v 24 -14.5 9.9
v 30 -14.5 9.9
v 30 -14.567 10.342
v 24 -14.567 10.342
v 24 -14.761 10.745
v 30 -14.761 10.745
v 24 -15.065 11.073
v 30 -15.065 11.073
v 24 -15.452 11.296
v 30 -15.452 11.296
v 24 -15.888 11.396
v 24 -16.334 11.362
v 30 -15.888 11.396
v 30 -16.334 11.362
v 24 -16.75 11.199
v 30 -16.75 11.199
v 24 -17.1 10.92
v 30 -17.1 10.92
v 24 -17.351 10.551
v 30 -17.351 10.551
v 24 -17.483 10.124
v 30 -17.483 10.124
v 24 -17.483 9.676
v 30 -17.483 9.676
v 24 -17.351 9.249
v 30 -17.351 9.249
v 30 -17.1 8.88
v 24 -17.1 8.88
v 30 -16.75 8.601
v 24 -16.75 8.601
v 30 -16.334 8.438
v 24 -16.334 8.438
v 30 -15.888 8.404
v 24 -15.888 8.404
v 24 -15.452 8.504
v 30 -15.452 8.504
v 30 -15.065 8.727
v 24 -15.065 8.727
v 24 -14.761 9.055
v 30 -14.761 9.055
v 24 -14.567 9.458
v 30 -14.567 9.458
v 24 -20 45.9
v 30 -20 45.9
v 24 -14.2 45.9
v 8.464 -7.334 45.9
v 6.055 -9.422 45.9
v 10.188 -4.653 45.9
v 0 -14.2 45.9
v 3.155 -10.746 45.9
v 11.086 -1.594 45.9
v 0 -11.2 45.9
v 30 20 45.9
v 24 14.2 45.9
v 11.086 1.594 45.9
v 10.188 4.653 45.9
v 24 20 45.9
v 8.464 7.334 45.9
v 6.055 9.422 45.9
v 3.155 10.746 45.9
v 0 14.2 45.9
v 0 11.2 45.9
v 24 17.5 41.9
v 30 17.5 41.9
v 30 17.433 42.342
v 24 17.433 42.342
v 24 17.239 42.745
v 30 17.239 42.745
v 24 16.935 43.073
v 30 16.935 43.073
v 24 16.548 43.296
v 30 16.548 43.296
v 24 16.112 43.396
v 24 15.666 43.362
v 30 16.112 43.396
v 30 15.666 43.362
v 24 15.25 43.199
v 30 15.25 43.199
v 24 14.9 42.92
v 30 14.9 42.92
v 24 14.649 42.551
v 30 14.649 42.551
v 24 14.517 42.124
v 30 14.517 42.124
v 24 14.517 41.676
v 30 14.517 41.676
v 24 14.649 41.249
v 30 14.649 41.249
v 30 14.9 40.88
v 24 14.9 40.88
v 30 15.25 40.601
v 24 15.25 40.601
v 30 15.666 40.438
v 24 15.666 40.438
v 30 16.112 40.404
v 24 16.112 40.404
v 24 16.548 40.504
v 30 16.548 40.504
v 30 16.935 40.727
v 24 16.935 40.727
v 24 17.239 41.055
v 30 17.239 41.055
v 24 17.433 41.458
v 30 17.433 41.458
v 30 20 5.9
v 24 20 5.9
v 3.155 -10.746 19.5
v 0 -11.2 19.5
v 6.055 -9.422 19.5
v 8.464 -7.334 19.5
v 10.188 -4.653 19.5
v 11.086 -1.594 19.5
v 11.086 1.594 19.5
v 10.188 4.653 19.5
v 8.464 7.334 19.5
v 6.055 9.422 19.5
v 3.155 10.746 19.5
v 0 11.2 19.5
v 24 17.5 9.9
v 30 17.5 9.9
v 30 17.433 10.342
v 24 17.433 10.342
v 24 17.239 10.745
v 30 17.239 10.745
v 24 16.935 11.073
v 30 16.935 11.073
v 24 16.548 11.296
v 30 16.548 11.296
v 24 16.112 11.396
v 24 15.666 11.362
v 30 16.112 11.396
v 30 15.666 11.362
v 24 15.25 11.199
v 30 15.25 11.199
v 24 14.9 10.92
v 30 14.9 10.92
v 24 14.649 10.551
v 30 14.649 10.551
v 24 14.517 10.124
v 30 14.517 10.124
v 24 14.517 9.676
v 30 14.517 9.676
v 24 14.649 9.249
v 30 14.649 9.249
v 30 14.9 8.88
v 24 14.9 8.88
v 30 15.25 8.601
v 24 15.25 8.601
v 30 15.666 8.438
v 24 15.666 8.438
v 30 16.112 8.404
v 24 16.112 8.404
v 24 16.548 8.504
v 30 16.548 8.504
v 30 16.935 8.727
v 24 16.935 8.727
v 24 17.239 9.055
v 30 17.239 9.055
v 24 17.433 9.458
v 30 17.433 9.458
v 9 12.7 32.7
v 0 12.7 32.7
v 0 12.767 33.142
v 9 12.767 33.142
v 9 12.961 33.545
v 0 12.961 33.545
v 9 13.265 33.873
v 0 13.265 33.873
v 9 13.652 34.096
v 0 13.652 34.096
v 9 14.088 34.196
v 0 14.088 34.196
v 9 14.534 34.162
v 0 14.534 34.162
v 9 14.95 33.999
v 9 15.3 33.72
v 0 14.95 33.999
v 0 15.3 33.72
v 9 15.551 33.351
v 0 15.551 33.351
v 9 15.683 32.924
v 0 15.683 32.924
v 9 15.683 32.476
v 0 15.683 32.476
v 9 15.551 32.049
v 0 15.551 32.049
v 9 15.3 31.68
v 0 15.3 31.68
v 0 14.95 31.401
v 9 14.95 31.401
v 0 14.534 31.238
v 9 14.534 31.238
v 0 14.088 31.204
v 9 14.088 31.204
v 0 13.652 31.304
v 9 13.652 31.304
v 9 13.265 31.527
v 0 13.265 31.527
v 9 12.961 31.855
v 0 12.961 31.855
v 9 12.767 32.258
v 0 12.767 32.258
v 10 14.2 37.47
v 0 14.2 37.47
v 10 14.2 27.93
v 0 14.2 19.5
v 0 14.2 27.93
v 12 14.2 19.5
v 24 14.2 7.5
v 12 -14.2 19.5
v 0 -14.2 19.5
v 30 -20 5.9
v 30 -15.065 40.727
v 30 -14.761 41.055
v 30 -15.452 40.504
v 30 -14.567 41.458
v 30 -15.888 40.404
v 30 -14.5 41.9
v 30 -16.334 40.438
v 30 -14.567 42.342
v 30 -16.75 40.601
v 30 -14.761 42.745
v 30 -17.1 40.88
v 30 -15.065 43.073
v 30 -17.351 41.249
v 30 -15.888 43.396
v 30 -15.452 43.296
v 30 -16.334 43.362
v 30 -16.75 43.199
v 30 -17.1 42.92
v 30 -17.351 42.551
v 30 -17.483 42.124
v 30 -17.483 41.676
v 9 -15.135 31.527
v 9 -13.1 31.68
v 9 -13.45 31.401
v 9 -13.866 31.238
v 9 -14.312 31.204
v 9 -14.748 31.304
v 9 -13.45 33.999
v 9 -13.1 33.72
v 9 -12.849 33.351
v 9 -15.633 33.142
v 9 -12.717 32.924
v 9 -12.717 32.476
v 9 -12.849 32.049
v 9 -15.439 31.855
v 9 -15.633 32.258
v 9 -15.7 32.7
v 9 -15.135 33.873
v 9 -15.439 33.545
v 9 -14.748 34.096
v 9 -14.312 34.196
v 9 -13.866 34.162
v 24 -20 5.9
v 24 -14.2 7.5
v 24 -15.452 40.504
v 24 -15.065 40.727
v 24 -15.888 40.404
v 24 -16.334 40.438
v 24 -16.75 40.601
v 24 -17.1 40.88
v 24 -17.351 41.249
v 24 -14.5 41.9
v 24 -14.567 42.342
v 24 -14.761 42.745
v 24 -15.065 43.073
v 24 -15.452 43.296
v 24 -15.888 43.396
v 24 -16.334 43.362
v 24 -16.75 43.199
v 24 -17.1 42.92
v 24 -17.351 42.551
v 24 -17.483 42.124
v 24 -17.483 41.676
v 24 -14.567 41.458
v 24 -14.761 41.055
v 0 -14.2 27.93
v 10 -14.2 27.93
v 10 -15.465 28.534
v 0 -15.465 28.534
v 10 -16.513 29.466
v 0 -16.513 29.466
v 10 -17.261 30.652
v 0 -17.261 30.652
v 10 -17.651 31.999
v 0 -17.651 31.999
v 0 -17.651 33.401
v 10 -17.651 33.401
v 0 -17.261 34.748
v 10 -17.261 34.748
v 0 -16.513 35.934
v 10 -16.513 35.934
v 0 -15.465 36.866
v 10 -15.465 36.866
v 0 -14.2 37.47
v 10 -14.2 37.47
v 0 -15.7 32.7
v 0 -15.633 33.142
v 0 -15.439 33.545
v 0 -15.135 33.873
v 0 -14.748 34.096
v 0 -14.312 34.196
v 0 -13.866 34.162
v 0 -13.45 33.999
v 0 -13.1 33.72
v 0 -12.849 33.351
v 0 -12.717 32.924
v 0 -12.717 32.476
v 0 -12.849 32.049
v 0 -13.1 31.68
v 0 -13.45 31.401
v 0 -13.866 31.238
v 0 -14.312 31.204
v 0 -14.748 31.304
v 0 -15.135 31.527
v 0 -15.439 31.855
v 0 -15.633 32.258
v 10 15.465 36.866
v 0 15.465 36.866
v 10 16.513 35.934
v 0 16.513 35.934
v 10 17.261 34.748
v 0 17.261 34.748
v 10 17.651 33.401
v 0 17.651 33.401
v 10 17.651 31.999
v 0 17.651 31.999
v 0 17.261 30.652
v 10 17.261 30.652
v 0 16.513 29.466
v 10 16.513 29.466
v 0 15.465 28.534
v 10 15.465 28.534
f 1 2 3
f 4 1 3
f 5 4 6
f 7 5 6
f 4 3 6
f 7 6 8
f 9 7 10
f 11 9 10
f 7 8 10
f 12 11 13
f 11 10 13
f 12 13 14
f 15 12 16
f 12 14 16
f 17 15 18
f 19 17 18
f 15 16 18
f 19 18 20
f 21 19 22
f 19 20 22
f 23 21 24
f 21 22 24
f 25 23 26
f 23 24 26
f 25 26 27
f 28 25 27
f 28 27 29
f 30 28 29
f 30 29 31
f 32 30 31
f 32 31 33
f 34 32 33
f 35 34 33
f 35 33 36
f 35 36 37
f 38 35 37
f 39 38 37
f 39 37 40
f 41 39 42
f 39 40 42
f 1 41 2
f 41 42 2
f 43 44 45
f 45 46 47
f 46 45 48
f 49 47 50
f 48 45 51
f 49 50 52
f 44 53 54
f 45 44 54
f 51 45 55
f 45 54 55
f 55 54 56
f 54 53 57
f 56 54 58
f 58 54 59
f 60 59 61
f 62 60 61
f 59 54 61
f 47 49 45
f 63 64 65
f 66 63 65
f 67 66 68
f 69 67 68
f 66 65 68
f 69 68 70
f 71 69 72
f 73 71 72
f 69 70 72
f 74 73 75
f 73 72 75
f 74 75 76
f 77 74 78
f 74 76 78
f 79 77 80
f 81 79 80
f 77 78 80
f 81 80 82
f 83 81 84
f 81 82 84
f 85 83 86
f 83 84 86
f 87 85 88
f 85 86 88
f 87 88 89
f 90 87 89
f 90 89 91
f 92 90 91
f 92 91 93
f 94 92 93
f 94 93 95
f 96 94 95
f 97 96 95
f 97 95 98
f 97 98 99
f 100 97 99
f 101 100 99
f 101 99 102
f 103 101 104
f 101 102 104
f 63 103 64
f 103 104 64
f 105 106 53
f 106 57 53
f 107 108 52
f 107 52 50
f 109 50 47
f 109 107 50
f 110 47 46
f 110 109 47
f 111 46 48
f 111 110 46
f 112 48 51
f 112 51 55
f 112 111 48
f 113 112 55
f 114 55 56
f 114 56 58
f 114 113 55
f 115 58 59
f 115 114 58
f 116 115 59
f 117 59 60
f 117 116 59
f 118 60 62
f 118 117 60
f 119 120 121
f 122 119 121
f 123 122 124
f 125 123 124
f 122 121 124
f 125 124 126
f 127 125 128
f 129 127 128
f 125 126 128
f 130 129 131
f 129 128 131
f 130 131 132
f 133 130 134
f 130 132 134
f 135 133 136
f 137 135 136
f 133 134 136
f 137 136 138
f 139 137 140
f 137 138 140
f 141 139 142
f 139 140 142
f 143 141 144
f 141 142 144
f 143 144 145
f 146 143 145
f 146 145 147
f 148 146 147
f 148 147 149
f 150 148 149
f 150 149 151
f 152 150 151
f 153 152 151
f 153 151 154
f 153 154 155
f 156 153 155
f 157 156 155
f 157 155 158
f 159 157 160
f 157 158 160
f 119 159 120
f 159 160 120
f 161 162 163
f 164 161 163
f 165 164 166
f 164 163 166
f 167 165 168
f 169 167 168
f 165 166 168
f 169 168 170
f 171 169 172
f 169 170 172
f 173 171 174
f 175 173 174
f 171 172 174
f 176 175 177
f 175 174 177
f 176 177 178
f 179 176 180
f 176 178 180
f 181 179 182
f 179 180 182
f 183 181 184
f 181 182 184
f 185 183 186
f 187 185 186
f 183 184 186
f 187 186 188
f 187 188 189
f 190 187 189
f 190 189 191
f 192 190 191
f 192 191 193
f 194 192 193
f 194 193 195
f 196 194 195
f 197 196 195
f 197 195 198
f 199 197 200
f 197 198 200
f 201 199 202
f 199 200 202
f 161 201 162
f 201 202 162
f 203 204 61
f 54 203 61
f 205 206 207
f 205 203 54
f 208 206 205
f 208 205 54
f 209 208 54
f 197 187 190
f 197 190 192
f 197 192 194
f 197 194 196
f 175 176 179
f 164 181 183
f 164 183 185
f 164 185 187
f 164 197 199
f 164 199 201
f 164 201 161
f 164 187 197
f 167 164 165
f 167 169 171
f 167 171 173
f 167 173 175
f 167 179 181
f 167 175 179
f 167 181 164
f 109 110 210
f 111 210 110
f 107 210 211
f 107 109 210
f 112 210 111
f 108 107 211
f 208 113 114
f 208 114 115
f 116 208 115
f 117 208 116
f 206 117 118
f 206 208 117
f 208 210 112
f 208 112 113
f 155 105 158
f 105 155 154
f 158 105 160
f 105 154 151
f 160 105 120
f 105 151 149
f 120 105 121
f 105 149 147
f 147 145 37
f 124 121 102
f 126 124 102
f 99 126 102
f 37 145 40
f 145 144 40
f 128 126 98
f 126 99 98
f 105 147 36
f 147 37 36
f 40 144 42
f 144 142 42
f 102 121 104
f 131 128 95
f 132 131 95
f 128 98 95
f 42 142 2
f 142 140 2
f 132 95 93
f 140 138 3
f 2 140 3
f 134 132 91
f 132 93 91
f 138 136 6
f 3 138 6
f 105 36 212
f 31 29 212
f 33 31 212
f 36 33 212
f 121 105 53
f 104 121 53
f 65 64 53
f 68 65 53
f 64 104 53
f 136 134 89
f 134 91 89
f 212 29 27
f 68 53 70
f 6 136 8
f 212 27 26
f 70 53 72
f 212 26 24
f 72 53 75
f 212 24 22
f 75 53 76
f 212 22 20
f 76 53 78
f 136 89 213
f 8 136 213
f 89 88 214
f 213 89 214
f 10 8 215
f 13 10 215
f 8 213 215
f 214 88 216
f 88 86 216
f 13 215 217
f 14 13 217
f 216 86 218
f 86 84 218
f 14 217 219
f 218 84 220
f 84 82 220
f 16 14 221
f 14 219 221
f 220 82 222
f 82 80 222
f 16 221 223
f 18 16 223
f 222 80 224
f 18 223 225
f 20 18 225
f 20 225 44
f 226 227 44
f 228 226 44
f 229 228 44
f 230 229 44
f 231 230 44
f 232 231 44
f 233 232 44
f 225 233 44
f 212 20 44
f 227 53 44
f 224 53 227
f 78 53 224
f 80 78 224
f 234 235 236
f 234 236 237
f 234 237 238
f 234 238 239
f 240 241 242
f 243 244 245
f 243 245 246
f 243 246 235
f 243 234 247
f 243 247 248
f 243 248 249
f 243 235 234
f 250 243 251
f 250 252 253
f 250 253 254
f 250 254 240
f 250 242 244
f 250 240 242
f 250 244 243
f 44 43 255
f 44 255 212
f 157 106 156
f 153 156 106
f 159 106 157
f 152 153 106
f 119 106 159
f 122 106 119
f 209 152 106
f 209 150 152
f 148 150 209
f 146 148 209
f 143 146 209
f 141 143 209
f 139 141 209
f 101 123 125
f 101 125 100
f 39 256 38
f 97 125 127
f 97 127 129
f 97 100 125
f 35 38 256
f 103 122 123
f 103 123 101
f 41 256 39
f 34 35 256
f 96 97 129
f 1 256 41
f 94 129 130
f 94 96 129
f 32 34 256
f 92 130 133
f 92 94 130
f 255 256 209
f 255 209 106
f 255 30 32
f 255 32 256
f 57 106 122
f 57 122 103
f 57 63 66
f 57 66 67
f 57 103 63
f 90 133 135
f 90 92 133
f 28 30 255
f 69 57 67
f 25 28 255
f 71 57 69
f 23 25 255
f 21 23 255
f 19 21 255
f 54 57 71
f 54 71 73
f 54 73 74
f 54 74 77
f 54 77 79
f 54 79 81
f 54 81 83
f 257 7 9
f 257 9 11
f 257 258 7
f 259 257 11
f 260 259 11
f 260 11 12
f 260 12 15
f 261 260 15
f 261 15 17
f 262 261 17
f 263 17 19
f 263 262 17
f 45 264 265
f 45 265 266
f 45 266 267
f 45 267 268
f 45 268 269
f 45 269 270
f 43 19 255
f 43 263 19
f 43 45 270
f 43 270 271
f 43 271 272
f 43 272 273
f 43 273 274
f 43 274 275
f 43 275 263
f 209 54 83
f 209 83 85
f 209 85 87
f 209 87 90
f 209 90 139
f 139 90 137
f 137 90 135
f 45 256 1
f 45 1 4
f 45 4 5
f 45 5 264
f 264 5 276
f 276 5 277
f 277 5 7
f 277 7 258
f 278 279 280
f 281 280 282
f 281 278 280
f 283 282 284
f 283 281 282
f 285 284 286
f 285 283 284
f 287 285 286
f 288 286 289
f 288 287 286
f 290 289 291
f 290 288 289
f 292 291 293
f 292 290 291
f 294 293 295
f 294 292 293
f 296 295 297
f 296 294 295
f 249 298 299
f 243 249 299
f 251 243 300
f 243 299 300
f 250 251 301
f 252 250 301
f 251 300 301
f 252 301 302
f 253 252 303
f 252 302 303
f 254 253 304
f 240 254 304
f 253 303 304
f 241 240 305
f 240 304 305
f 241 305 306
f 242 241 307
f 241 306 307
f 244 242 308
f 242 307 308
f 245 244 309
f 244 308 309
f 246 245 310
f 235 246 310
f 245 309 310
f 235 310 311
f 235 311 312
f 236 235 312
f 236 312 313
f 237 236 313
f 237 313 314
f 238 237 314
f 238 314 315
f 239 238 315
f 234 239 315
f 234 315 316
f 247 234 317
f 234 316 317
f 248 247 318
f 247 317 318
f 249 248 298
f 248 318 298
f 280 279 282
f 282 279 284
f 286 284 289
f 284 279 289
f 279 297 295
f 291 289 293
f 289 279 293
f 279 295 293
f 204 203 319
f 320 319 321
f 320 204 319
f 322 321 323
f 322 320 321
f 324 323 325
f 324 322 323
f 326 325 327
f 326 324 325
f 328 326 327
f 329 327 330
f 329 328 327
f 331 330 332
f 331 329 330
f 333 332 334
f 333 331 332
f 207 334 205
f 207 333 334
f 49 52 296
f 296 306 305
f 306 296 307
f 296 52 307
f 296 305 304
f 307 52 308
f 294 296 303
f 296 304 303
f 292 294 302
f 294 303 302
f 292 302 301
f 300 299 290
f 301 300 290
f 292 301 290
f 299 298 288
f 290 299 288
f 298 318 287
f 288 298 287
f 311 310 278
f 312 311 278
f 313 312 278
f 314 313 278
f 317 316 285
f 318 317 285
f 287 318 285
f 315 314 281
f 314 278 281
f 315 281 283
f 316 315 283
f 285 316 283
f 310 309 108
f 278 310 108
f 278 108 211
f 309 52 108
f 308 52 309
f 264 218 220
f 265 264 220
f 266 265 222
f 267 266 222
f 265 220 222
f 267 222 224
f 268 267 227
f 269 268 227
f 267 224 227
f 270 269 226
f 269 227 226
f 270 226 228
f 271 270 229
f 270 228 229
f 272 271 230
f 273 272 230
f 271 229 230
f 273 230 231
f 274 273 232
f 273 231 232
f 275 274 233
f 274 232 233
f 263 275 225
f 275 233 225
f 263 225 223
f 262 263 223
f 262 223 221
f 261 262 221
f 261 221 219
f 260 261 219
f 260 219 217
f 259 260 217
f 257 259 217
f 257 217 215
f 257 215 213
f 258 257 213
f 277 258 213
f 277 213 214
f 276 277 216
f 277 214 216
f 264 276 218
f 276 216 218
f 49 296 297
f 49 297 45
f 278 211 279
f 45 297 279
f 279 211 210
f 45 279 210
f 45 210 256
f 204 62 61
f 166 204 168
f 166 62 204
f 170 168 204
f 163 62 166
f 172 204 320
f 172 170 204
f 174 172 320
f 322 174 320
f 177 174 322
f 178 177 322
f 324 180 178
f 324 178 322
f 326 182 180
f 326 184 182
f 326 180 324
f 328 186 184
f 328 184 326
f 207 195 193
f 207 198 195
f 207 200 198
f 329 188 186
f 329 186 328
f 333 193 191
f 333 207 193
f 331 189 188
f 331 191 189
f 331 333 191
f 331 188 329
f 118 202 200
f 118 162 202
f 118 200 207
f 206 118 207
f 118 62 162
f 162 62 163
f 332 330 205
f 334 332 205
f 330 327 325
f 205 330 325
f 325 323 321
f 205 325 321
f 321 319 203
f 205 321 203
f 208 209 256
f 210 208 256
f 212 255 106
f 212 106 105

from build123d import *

# Parameters (mm, degrees)
PAD005_DEPTH    = 26.4
SKETCH068_W     = 6
SKETCH068_H     = 40
PAD006_DEPTH    = 13.6
SKETCH070_R     = 1.5
POCKET004_DEPTH = 6
PAD007_DEPTH    = 10
SKETCH071_R     = 1.5
POCKET005_DEPTH = 9
CHAMFER003_SIZE = 12


with BuildPart() as part:
    # Sketch067 → Pad005 (new body)
    with BuildSketch(Plane.XY.offset(19.5)):
        with BuildLine():
            ThreePointArc((0, -11.2), (11.2, 0), (0, 11.2))
            Line((0, 11.2), (0, 14.2))
            Line((0, 14.2), (24, 14.2))
            Line((24, 14.2), (24, 20))
            Line((30, 20), (24, 20))
            Line((30, 20), (30, -20))
            Line((30, -20), (24, -20))
            Line((24, -14.2), (24, -20))
            Line((0, -14.2), (24, -14.2))
            Line((0, -11.2), (0, -14.2))
        make_face()
    extrude(amount=PAD005_DEPTH)

    # Sketch068 → Pad006 (new body)
    with BuildSketch(Plane(origin=(0, 0, 19.5), x_dir=(1, 0, 0), z_dir=(0, 0, -1))):
        with Locations((27, 0)):
            Rectangle(SKETCH068_W, SKETCH068_H)
    extrude(amount=PAD006_DEPTH)

    # Sketch070 → Pocket004 (cut)
    with BuildSketch(Plane(origin=(30, 0, 19.5), x_dir=(0, 1, 0), z_dir=(1, 0, 0))):
        with Locations((-16, 22.4)):
            Circle(SKETCH070_R)
        with Locations((16, 22.4)):
            Circle(SKETCH070_R)
        with Locations((16, -9.6)):
            Circle(SKETCH070_R)
        with Locations((-16, -9.6)):
            Circle(SKETCH070_R)
    extrude(amount=-POCKET004_DEPTH, mode=Mode.SUBTRACT)

    # Sketch069 → Pad007 (new body)
    with BuildSketch(Plane(origin=(0, 0, 19.5), x_dir=(0, -1, 0), z_dir=(-1, 0, 0))):
        with BuildLine():
            ThreePointArc((-11.2, 17.969696), (-17.7, 13.2), (-11.2, 8.430304))
            Line((-11.2, 17.969696), (-11.2, 8.430304))
        make_face()
        with BuildLine():
            ThreePointArc((11.2, 8.430304), (17.7, 13.2), (11.2, 17.969696))
            Line((11.2, 17.969696), (11.2, 8.430304))
        make_face()
    extrude(amount=-PAD007_DEPTH)

    # Sketch071 → Pocket005 (cut)
    with BuildSketch(Plane(origin=(0, 0, 19.5), x_dir=(0, -1, 0), z_dir=(-1, 0, 0))):
        with Locations((-14.2, 13.2)):
            Circle(SKETCH071_R)
        with Locations((14.2, 13.2)):
            Circle(SKETCH071_R)
    extrude(amount=-POCKET005_DEPTH, mode=Mode.SUBTRACT)

    # Chamfer003
    chamfer003_edges = [part.edges().sort_by_distance(p)[0] for p in [
        (24, 0, 19.5),
    ]]
    chamfer(chamfer003_edges, length=CHAMFER003_SIZE)


solid = part.part
